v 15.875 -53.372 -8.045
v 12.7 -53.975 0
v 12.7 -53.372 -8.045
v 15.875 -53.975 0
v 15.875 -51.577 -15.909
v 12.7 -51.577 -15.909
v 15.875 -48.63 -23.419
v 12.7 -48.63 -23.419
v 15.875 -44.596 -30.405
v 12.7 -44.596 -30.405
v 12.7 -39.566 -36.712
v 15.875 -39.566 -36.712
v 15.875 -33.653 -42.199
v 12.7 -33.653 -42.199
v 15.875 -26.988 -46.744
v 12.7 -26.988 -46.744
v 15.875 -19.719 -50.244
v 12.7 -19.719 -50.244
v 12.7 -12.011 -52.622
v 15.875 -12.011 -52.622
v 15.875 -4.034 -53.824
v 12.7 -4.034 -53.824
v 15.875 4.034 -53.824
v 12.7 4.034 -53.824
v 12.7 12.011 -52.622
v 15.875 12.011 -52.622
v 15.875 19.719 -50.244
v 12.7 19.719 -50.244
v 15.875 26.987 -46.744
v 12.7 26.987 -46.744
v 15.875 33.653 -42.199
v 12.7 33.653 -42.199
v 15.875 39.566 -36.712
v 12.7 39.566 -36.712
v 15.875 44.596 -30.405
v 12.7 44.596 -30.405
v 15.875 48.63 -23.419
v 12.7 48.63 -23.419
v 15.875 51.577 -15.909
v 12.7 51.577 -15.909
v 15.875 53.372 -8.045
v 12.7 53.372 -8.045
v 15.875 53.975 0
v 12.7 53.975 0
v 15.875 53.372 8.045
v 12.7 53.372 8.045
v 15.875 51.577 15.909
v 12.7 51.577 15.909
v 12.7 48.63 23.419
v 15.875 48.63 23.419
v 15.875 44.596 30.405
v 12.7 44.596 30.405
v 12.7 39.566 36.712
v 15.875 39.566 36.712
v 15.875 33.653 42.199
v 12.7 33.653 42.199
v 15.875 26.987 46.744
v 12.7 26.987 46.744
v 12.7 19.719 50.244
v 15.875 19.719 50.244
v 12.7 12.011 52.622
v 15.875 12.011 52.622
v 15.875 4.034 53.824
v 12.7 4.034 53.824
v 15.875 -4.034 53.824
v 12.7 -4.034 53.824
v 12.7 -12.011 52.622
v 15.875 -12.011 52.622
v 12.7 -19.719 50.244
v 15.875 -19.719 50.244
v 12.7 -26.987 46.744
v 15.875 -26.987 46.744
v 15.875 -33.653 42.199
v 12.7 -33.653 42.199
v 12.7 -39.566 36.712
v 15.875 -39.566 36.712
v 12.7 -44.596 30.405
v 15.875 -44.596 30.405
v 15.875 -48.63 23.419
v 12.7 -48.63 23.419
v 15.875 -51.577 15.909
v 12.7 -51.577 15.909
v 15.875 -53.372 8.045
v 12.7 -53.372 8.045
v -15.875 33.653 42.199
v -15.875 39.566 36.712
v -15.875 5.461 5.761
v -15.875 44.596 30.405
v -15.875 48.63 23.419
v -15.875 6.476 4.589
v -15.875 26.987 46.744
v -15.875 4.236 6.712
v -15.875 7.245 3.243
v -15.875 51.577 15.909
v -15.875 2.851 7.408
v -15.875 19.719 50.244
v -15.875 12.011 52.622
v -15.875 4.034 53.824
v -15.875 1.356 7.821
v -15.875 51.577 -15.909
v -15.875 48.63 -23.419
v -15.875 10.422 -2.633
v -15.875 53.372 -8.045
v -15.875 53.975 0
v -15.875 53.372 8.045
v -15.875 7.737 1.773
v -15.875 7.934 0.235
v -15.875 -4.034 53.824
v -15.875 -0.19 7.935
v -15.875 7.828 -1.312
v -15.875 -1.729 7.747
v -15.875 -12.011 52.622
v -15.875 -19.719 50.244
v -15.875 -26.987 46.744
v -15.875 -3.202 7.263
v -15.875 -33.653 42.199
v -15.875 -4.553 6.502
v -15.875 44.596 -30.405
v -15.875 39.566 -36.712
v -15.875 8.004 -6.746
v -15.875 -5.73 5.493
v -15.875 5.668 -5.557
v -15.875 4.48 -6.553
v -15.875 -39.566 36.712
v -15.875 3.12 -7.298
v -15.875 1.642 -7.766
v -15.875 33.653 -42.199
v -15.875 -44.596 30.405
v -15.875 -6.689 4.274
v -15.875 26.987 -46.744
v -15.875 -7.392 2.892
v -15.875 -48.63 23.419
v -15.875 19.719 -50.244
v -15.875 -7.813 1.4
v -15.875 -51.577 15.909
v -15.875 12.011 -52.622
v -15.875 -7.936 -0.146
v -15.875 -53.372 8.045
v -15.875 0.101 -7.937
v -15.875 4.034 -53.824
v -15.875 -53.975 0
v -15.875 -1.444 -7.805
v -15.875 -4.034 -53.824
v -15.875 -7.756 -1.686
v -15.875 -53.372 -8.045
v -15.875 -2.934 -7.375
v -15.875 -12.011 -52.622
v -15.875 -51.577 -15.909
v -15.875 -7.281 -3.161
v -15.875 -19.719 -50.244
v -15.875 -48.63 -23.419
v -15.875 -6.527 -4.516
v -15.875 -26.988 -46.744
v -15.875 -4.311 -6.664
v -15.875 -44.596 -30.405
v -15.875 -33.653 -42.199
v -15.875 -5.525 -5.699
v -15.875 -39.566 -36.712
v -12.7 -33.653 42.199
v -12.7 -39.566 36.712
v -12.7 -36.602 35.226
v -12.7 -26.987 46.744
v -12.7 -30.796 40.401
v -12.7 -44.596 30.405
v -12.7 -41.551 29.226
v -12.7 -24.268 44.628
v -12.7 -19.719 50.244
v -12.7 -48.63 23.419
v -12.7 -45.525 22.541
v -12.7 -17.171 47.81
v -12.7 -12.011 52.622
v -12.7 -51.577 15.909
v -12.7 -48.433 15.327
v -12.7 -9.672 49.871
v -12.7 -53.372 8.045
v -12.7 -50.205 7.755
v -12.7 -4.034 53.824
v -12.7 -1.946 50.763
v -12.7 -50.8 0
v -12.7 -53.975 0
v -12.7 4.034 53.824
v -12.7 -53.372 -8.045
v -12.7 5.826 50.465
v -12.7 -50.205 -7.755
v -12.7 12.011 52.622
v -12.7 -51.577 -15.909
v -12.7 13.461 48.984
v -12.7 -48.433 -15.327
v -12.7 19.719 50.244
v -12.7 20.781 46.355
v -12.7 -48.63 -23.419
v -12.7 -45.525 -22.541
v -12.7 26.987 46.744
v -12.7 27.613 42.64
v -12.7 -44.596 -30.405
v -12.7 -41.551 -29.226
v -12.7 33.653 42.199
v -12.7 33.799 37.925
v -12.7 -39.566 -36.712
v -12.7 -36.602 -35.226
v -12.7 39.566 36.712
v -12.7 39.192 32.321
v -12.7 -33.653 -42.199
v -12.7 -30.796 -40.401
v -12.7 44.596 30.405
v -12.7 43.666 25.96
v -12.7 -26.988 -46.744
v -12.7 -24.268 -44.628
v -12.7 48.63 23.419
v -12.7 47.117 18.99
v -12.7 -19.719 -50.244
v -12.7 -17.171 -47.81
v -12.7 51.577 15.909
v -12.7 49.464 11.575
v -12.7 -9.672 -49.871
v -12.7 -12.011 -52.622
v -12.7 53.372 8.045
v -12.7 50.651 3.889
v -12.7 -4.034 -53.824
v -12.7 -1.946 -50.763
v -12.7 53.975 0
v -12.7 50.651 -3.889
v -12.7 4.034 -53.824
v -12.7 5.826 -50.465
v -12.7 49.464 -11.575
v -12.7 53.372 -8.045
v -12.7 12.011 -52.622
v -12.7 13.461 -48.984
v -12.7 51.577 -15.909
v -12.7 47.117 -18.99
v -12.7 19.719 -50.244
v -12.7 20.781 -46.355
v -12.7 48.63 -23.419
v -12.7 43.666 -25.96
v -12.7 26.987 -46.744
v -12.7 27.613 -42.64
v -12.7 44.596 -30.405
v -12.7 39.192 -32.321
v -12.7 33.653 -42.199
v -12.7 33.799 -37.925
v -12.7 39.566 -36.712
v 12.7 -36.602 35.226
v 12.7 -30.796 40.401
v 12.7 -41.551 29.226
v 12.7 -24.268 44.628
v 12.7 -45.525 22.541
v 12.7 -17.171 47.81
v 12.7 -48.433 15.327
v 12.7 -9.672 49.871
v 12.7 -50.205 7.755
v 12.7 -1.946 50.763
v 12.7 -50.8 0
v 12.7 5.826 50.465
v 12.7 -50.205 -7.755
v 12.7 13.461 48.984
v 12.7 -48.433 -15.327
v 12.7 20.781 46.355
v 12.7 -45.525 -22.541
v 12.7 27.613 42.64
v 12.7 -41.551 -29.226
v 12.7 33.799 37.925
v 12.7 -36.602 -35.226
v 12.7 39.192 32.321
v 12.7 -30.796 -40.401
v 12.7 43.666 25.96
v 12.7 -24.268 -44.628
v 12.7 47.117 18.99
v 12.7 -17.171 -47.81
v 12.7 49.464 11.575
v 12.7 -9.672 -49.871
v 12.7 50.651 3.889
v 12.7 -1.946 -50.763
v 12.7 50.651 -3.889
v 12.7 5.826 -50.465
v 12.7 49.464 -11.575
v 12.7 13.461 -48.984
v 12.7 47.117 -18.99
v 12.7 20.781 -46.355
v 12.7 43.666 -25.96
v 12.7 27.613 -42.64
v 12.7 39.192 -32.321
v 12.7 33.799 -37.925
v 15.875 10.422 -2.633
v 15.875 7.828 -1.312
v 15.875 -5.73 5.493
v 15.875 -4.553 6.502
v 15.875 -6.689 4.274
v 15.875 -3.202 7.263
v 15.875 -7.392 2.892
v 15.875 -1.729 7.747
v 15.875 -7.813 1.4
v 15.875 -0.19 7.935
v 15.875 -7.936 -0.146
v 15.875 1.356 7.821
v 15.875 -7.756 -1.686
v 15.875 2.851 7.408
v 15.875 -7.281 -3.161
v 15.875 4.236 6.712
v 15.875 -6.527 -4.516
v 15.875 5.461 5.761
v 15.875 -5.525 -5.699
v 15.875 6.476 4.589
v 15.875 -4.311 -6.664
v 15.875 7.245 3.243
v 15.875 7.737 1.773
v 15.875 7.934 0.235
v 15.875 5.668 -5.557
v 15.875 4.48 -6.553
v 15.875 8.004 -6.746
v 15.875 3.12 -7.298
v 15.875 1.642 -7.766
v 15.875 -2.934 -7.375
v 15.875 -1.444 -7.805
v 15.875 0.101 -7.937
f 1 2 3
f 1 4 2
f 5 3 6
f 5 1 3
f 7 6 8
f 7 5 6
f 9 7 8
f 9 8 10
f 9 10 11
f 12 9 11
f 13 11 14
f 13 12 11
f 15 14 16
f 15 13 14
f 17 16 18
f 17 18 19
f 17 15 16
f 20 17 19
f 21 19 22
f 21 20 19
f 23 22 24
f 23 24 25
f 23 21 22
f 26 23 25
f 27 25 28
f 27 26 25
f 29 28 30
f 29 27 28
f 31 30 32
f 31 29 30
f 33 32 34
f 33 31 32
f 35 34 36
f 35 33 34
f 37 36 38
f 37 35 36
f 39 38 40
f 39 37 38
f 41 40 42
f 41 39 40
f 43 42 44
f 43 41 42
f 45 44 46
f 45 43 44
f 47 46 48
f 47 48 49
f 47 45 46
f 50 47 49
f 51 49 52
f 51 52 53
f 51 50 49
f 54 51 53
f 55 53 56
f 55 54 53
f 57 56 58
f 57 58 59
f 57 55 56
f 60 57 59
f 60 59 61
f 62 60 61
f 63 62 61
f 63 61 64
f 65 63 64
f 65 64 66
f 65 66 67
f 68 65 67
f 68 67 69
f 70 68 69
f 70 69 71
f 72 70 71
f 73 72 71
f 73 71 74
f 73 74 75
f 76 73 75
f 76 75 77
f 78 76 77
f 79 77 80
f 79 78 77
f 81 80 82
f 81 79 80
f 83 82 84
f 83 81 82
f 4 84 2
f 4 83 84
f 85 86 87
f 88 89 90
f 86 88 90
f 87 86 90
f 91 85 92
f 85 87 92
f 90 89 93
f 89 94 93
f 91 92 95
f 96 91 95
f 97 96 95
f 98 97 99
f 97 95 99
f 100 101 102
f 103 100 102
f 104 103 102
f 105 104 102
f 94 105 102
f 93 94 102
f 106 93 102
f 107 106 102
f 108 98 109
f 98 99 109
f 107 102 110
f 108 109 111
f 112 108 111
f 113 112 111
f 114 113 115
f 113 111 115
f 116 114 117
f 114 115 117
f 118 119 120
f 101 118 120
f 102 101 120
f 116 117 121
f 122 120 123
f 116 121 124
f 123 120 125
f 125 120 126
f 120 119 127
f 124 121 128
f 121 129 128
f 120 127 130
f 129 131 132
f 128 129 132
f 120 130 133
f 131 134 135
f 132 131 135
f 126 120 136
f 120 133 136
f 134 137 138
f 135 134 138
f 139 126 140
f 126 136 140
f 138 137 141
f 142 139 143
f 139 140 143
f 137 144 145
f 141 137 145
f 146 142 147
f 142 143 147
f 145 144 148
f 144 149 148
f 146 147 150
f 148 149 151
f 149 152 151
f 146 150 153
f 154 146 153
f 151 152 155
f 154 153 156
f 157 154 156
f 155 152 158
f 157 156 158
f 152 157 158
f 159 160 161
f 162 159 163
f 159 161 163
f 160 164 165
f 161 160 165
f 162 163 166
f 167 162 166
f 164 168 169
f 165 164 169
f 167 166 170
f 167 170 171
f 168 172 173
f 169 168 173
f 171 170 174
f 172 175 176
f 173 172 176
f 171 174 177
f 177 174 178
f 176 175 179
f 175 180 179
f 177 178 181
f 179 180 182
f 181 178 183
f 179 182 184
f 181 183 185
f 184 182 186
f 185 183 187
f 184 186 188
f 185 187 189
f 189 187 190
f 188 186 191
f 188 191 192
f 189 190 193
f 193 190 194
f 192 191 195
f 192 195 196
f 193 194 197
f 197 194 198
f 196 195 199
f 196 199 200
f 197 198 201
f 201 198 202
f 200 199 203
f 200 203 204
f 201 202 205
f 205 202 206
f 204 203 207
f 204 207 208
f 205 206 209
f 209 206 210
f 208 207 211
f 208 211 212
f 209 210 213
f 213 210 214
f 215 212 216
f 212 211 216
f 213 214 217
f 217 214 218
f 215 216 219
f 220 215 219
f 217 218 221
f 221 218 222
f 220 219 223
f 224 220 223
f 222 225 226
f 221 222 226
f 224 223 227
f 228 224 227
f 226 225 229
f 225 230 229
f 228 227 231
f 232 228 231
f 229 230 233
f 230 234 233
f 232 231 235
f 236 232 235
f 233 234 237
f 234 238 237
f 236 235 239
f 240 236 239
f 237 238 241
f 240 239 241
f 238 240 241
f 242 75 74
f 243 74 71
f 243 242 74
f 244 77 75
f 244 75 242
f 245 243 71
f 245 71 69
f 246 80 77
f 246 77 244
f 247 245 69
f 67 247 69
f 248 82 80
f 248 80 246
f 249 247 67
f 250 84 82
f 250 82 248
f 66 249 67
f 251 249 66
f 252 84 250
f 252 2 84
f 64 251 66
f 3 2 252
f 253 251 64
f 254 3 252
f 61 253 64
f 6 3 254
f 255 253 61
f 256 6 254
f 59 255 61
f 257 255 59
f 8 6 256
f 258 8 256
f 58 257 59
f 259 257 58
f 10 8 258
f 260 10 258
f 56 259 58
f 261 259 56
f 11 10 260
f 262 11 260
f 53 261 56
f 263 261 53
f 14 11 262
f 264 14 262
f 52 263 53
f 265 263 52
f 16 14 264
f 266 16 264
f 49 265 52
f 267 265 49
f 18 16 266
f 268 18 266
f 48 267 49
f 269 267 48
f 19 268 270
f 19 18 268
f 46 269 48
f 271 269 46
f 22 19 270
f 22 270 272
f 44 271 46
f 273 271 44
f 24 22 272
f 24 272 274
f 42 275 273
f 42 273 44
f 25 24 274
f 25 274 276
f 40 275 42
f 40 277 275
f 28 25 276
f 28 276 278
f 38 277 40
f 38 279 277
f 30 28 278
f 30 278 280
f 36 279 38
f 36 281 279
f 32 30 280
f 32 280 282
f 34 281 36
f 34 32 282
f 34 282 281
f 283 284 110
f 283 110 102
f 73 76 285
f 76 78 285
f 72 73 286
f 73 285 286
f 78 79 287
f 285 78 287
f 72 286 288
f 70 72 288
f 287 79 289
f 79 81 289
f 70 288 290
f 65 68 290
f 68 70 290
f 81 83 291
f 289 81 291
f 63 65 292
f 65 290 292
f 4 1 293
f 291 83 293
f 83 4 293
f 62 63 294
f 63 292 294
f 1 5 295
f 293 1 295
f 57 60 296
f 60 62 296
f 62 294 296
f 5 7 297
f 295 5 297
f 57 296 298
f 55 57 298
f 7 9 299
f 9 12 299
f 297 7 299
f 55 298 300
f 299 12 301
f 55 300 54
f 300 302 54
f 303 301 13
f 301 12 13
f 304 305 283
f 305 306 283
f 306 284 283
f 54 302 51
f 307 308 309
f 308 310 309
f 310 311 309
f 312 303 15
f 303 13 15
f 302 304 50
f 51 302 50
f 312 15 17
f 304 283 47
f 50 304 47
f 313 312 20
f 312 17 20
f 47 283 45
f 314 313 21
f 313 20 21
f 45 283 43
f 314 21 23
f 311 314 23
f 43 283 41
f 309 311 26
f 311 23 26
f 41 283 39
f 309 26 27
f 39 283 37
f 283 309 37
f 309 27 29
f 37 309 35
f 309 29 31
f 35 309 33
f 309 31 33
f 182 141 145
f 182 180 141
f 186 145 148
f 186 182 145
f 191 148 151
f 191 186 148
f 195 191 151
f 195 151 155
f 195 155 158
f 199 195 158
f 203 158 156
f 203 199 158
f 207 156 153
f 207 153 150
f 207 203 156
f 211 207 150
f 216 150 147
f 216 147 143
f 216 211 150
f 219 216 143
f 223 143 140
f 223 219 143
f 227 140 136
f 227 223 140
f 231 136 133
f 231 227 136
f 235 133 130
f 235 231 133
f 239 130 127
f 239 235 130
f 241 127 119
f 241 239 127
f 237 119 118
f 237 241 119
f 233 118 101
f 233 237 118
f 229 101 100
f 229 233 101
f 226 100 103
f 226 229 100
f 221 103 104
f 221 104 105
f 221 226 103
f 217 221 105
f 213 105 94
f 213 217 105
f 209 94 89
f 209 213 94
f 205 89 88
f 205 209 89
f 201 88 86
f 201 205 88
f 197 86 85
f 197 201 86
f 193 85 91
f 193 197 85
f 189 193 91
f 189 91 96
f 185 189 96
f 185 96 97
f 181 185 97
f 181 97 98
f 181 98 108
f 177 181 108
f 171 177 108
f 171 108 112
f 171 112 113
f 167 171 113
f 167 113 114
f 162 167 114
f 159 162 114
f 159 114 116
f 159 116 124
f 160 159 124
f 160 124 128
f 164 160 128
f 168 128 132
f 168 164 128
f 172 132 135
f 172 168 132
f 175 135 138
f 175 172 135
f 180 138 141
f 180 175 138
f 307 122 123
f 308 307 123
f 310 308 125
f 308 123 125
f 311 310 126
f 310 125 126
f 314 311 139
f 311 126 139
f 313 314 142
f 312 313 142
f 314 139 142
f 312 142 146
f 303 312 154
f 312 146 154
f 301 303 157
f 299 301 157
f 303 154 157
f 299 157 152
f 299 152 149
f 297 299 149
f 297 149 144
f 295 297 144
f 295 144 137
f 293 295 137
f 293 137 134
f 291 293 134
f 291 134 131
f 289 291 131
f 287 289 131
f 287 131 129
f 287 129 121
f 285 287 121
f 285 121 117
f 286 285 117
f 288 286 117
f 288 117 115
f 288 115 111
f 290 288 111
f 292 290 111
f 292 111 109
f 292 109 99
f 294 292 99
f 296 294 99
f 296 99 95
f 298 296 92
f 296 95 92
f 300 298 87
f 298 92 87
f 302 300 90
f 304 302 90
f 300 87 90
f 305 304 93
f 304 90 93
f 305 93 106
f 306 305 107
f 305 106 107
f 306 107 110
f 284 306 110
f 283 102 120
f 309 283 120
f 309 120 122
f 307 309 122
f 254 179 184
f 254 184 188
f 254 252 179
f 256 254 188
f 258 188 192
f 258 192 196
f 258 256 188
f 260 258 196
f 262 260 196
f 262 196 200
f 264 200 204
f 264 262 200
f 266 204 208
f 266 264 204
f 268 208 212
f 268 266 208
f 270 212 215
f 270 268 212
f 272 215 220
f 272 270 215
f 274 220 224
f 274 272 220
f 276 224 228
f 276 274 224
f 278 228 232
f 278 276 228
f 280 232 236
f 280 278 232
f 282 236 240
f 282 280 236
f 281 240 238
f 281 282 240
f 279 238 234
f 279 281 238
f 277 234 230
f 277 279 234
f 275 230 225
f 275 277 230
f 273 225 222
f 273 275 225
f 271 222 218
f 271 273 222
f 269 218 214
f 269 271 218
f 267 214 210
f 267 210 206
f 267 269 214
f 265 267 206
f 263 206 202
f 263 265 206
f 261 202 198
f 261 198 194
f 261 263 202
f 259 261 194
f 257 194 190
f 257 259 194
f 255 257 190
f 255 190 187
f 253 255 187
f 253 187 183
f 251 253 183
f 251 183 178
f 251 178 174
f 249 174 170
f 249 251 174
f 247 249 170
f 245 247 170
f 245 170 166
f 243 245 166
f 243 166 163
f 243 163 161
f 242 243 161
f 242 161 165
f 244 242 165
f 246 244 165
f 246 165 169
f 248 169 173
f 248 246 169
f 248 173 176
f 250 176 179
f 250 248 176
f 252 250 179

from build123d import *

# Parameters (mm, degrees)
SKETCH1_W          = 31.75
SKETCH1_H          = 50.8
SKETCH1_W_2        = 3.175
SKETCH1_H_2        = 3.175
CUT_EXTRUDE1_DEPTH = 83.672025196


with BuildPart() as part:
    # Sketch1 → Revolve1 (revolve)
    with BuildSketch(Plane.XY, mode=Mode.PRIVATE) as revolve1_sk:
        with Locations((0, 25.4)):
            Rectangle(SKETCH1_W, SKETCH1_H)
        with Locations((-14.2875, 52.3875)):
            Rectangle(SKETCH1_W_2, SKETCH1_H_2)
        with Locations((14.2875, 52.3875)):
            Rectangle(SKETCH1_W_2, SKETCH1_H_2)
    revolve(revolve1_sk.sketch.rotate(Axis((-15.875, 0, 0), (1, 0, 0)), 180), axis=Axis((-15.875, 0, 0), (1, 0, 0)))

    # Sketch2 → Cut-Extrude1 (cut, through all)
    with BuildSketch(Plane.ZY.offset(15.875)):
        with BuildLine():
            Line((-6.745565901, 8.004027254), (-5.556686402, 5.668081023))
            ThreePointArc((-5.556686402, 5.668081023), (3.600316682, -7.074010605), (-1.312280039, 7.828271032))
            Line((-1.312280039, 7.828271032), (-2.632559092, 10.422395062))
            Line((-2.632559092, 10.422395062), (-6.745565901, 8.004027254))
        make_face()
    extrude(amount=-CUT_EXTRUDE1_DEPTH, mode=Mode.SUBTRACT)


solid = part.part
